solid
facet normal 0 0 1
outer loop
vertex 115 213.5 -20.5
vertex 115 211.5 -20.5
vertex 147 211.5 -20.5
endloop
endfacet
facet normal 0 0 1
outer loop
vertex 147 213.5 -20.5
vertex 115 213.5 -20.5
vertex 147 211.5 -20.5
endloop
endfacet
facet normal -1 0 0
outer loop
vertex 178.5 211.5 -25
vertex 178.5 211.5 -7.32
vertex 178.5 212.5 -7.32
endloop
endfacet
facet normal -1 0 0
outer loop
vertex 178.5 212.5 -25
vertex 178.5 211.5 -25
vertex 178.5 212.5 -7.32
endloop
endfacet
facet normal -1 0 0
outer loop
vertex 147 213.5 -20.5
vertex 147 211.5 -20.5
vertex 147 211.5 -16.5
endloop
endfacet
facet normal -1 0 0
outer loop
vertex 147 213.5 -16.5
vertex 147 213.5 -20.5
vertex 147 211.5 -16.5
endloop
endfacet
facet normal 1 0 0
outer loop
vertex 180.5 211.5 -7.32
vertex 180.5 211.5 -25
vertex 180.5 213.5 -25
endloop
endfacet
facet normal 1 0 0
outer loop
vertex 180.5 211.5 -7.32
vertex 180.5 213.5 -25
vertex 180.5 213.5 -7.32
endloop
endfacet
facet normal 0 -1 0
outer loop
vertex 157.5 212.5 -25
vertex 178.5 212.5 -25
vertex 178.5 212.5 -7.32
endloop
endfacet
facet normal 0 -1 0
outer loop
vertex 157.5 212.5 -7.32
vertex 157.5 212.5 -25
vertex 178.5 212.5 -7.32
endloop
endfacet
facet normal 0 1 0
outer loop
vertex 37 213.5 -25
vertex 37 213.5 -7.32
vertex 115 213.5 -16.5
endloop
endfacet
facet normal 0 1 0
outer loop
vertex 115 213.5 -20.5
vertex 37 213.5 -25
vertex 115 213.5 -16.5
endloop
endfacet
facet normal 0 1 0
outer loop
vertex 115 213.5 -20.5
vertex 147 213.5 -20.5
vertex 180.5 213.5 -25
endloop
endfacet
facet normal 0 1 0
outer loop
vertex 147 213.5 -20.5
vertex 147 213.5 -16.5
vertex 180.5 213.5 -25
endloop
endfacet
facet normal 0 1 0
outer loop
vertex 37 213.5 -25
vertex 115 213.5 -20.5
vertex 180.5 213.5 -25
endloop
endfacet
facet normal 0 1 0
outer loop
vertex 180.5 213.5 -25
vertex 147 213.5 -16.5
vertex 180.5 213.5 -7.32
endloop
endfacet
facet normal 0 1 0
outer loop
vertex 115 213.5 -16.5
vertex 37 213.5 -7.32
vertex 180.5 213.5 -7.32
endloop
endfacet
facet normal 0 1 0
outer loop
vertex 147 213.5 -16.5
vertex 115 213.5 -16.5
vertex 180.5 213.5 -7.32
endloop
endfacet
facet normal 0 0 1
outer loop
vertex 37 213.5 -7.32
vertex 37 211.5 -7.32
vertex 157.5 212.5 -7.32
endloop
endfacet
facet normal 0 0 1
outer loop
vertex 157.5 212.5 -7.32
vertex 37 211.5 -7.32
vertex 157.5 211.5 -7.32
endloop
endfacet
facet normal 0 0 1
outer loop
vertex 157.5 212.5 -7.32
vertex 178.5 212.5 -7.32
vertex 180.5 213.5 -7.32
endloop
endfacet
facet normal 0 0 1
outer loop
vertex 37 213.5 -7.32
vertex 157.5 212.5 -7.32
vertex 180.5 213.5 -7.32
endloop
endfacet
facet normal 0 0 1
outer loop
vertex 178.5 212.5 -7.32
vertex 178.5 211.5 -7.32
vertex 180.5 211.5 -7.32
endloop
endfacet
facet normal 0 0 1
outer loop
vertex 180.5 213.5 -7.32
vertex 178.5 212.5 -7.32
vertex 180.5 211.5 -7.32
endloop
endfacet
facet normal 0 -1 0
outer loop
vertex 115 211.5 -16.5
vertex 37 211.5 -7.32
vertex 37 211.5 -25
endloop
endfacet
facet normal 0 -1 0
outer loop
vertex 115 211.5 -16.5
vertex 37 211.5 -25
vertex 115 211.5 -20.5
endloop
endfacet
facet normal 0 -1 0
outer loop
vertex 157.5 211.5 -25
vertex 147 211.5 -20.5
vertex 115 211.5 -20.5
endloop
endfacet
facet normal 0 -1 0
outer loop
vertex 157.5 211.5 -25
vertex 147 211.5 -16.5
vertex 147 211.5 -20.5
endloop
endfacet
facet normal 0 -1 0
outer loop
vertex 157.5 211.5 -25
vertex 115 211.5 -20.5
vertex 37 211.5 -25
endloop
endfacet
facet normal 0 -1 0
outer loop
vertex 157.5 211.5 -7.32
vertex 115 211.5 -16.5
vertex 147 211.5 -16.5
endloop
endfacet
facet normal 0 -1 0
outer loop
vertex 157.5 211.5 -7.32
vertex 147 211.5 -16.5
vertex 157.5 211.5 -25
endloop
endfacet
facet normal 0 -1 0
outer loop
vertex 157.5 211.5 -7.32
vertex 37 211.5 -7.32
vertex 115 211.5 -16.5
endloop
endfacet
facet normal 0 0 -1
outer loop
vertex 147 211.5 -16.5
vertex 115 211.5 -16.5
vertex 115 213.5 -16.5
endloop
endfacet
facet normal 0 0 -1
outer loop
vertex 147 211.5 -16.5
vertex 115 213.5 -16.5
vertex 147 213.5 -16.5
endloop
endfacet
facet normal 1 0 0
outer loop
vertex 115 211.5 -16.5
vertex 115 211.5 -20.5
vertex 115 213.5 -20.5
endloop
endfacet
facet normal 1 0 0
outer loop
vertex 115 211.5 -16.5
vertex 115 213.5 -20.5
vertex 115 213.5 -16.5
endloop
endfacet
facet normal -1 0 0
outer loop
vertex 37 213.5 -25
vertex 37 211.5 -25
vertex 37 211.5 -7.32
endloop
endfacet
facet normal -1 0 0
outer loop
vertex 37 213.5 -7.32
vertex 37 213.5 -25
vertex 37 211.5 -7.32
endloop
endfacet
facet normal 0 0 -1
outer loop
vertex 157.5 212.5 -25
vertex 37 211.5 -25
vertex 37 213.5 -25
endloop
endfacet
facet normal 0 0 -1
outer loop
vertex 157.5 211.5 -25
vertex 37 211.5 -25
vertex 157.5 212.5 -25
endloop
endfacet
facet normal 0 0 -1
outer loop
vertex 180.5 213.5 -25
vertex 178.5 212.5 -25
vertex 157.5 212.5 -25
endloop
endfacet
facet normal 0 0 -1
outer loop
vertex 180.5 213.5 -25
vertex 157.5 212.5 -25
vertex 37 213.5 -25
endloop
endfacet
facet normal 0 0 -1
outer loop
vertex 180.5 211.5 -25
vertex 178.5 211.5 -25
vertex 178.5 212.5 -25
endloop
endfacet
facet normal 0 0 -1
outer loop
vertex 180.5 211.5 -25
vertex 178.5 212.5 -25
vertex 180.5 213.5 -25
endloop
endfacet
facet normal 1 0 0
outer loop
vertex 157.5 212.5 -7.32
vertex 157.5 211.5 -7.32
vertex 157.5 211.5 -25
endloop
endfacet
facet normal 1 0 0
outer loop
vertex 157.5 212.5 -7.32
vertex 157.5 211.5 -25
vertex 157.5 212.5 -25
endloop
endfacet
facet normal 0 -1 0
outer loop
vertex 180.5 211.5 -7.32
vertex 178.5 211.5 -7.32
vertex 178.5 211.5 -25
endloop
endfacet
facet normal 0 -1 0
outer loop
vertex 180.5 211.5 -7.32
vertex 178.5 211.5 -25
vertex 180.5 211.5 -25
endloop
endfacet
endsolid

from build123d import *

# Parameters (mm, degrees)
EXTRUDE099_DEPTH = 21
SKETCH081_W      = 143.5
SKETCH081_H      = 17.68
SKETCH081_W_2    = 32
SKETCH081_H_2    = 4
EXTRUDE073_DEPTH = 2


with BuildPart() as body060:
    # Sketch109 → Extrude099 (new body)
    with BuildSketch(Plane(origin=(178.5, 0, 0), x_dir=(0, -1, 0), z_dir=(-1, 0, 0))):
        Polygon((-212.5, 6.32), (-204, 6.32), (-204, 5.32), (-211.5, 5.32), (-211.5, -25), (-212.5, -25), align=None)
    extrude(amount=EXTRUDE099_DEPTH)


with BuildPart() as cut012:
    # Sketch081 → Extrude073 (new body)
    with BuildSketch(Plane.XZ.offset(-211.5)):
        with Locations((108.75, -16.16)):
            Rectangle(SKETCH081_W, SKETCH081_H)
        with Locations((131, -18.5)):
            Rectangle(SKETCH081_W_2, SKETCH081_H_2, mode=Mode.SUBTRACT)
    extrude(amount=-EXTRUDE073_DEPTH)

    # Cut012: cut Body060
    add(body060.part, mode=Mode.SUBTRACT)


solid = cut012.part
